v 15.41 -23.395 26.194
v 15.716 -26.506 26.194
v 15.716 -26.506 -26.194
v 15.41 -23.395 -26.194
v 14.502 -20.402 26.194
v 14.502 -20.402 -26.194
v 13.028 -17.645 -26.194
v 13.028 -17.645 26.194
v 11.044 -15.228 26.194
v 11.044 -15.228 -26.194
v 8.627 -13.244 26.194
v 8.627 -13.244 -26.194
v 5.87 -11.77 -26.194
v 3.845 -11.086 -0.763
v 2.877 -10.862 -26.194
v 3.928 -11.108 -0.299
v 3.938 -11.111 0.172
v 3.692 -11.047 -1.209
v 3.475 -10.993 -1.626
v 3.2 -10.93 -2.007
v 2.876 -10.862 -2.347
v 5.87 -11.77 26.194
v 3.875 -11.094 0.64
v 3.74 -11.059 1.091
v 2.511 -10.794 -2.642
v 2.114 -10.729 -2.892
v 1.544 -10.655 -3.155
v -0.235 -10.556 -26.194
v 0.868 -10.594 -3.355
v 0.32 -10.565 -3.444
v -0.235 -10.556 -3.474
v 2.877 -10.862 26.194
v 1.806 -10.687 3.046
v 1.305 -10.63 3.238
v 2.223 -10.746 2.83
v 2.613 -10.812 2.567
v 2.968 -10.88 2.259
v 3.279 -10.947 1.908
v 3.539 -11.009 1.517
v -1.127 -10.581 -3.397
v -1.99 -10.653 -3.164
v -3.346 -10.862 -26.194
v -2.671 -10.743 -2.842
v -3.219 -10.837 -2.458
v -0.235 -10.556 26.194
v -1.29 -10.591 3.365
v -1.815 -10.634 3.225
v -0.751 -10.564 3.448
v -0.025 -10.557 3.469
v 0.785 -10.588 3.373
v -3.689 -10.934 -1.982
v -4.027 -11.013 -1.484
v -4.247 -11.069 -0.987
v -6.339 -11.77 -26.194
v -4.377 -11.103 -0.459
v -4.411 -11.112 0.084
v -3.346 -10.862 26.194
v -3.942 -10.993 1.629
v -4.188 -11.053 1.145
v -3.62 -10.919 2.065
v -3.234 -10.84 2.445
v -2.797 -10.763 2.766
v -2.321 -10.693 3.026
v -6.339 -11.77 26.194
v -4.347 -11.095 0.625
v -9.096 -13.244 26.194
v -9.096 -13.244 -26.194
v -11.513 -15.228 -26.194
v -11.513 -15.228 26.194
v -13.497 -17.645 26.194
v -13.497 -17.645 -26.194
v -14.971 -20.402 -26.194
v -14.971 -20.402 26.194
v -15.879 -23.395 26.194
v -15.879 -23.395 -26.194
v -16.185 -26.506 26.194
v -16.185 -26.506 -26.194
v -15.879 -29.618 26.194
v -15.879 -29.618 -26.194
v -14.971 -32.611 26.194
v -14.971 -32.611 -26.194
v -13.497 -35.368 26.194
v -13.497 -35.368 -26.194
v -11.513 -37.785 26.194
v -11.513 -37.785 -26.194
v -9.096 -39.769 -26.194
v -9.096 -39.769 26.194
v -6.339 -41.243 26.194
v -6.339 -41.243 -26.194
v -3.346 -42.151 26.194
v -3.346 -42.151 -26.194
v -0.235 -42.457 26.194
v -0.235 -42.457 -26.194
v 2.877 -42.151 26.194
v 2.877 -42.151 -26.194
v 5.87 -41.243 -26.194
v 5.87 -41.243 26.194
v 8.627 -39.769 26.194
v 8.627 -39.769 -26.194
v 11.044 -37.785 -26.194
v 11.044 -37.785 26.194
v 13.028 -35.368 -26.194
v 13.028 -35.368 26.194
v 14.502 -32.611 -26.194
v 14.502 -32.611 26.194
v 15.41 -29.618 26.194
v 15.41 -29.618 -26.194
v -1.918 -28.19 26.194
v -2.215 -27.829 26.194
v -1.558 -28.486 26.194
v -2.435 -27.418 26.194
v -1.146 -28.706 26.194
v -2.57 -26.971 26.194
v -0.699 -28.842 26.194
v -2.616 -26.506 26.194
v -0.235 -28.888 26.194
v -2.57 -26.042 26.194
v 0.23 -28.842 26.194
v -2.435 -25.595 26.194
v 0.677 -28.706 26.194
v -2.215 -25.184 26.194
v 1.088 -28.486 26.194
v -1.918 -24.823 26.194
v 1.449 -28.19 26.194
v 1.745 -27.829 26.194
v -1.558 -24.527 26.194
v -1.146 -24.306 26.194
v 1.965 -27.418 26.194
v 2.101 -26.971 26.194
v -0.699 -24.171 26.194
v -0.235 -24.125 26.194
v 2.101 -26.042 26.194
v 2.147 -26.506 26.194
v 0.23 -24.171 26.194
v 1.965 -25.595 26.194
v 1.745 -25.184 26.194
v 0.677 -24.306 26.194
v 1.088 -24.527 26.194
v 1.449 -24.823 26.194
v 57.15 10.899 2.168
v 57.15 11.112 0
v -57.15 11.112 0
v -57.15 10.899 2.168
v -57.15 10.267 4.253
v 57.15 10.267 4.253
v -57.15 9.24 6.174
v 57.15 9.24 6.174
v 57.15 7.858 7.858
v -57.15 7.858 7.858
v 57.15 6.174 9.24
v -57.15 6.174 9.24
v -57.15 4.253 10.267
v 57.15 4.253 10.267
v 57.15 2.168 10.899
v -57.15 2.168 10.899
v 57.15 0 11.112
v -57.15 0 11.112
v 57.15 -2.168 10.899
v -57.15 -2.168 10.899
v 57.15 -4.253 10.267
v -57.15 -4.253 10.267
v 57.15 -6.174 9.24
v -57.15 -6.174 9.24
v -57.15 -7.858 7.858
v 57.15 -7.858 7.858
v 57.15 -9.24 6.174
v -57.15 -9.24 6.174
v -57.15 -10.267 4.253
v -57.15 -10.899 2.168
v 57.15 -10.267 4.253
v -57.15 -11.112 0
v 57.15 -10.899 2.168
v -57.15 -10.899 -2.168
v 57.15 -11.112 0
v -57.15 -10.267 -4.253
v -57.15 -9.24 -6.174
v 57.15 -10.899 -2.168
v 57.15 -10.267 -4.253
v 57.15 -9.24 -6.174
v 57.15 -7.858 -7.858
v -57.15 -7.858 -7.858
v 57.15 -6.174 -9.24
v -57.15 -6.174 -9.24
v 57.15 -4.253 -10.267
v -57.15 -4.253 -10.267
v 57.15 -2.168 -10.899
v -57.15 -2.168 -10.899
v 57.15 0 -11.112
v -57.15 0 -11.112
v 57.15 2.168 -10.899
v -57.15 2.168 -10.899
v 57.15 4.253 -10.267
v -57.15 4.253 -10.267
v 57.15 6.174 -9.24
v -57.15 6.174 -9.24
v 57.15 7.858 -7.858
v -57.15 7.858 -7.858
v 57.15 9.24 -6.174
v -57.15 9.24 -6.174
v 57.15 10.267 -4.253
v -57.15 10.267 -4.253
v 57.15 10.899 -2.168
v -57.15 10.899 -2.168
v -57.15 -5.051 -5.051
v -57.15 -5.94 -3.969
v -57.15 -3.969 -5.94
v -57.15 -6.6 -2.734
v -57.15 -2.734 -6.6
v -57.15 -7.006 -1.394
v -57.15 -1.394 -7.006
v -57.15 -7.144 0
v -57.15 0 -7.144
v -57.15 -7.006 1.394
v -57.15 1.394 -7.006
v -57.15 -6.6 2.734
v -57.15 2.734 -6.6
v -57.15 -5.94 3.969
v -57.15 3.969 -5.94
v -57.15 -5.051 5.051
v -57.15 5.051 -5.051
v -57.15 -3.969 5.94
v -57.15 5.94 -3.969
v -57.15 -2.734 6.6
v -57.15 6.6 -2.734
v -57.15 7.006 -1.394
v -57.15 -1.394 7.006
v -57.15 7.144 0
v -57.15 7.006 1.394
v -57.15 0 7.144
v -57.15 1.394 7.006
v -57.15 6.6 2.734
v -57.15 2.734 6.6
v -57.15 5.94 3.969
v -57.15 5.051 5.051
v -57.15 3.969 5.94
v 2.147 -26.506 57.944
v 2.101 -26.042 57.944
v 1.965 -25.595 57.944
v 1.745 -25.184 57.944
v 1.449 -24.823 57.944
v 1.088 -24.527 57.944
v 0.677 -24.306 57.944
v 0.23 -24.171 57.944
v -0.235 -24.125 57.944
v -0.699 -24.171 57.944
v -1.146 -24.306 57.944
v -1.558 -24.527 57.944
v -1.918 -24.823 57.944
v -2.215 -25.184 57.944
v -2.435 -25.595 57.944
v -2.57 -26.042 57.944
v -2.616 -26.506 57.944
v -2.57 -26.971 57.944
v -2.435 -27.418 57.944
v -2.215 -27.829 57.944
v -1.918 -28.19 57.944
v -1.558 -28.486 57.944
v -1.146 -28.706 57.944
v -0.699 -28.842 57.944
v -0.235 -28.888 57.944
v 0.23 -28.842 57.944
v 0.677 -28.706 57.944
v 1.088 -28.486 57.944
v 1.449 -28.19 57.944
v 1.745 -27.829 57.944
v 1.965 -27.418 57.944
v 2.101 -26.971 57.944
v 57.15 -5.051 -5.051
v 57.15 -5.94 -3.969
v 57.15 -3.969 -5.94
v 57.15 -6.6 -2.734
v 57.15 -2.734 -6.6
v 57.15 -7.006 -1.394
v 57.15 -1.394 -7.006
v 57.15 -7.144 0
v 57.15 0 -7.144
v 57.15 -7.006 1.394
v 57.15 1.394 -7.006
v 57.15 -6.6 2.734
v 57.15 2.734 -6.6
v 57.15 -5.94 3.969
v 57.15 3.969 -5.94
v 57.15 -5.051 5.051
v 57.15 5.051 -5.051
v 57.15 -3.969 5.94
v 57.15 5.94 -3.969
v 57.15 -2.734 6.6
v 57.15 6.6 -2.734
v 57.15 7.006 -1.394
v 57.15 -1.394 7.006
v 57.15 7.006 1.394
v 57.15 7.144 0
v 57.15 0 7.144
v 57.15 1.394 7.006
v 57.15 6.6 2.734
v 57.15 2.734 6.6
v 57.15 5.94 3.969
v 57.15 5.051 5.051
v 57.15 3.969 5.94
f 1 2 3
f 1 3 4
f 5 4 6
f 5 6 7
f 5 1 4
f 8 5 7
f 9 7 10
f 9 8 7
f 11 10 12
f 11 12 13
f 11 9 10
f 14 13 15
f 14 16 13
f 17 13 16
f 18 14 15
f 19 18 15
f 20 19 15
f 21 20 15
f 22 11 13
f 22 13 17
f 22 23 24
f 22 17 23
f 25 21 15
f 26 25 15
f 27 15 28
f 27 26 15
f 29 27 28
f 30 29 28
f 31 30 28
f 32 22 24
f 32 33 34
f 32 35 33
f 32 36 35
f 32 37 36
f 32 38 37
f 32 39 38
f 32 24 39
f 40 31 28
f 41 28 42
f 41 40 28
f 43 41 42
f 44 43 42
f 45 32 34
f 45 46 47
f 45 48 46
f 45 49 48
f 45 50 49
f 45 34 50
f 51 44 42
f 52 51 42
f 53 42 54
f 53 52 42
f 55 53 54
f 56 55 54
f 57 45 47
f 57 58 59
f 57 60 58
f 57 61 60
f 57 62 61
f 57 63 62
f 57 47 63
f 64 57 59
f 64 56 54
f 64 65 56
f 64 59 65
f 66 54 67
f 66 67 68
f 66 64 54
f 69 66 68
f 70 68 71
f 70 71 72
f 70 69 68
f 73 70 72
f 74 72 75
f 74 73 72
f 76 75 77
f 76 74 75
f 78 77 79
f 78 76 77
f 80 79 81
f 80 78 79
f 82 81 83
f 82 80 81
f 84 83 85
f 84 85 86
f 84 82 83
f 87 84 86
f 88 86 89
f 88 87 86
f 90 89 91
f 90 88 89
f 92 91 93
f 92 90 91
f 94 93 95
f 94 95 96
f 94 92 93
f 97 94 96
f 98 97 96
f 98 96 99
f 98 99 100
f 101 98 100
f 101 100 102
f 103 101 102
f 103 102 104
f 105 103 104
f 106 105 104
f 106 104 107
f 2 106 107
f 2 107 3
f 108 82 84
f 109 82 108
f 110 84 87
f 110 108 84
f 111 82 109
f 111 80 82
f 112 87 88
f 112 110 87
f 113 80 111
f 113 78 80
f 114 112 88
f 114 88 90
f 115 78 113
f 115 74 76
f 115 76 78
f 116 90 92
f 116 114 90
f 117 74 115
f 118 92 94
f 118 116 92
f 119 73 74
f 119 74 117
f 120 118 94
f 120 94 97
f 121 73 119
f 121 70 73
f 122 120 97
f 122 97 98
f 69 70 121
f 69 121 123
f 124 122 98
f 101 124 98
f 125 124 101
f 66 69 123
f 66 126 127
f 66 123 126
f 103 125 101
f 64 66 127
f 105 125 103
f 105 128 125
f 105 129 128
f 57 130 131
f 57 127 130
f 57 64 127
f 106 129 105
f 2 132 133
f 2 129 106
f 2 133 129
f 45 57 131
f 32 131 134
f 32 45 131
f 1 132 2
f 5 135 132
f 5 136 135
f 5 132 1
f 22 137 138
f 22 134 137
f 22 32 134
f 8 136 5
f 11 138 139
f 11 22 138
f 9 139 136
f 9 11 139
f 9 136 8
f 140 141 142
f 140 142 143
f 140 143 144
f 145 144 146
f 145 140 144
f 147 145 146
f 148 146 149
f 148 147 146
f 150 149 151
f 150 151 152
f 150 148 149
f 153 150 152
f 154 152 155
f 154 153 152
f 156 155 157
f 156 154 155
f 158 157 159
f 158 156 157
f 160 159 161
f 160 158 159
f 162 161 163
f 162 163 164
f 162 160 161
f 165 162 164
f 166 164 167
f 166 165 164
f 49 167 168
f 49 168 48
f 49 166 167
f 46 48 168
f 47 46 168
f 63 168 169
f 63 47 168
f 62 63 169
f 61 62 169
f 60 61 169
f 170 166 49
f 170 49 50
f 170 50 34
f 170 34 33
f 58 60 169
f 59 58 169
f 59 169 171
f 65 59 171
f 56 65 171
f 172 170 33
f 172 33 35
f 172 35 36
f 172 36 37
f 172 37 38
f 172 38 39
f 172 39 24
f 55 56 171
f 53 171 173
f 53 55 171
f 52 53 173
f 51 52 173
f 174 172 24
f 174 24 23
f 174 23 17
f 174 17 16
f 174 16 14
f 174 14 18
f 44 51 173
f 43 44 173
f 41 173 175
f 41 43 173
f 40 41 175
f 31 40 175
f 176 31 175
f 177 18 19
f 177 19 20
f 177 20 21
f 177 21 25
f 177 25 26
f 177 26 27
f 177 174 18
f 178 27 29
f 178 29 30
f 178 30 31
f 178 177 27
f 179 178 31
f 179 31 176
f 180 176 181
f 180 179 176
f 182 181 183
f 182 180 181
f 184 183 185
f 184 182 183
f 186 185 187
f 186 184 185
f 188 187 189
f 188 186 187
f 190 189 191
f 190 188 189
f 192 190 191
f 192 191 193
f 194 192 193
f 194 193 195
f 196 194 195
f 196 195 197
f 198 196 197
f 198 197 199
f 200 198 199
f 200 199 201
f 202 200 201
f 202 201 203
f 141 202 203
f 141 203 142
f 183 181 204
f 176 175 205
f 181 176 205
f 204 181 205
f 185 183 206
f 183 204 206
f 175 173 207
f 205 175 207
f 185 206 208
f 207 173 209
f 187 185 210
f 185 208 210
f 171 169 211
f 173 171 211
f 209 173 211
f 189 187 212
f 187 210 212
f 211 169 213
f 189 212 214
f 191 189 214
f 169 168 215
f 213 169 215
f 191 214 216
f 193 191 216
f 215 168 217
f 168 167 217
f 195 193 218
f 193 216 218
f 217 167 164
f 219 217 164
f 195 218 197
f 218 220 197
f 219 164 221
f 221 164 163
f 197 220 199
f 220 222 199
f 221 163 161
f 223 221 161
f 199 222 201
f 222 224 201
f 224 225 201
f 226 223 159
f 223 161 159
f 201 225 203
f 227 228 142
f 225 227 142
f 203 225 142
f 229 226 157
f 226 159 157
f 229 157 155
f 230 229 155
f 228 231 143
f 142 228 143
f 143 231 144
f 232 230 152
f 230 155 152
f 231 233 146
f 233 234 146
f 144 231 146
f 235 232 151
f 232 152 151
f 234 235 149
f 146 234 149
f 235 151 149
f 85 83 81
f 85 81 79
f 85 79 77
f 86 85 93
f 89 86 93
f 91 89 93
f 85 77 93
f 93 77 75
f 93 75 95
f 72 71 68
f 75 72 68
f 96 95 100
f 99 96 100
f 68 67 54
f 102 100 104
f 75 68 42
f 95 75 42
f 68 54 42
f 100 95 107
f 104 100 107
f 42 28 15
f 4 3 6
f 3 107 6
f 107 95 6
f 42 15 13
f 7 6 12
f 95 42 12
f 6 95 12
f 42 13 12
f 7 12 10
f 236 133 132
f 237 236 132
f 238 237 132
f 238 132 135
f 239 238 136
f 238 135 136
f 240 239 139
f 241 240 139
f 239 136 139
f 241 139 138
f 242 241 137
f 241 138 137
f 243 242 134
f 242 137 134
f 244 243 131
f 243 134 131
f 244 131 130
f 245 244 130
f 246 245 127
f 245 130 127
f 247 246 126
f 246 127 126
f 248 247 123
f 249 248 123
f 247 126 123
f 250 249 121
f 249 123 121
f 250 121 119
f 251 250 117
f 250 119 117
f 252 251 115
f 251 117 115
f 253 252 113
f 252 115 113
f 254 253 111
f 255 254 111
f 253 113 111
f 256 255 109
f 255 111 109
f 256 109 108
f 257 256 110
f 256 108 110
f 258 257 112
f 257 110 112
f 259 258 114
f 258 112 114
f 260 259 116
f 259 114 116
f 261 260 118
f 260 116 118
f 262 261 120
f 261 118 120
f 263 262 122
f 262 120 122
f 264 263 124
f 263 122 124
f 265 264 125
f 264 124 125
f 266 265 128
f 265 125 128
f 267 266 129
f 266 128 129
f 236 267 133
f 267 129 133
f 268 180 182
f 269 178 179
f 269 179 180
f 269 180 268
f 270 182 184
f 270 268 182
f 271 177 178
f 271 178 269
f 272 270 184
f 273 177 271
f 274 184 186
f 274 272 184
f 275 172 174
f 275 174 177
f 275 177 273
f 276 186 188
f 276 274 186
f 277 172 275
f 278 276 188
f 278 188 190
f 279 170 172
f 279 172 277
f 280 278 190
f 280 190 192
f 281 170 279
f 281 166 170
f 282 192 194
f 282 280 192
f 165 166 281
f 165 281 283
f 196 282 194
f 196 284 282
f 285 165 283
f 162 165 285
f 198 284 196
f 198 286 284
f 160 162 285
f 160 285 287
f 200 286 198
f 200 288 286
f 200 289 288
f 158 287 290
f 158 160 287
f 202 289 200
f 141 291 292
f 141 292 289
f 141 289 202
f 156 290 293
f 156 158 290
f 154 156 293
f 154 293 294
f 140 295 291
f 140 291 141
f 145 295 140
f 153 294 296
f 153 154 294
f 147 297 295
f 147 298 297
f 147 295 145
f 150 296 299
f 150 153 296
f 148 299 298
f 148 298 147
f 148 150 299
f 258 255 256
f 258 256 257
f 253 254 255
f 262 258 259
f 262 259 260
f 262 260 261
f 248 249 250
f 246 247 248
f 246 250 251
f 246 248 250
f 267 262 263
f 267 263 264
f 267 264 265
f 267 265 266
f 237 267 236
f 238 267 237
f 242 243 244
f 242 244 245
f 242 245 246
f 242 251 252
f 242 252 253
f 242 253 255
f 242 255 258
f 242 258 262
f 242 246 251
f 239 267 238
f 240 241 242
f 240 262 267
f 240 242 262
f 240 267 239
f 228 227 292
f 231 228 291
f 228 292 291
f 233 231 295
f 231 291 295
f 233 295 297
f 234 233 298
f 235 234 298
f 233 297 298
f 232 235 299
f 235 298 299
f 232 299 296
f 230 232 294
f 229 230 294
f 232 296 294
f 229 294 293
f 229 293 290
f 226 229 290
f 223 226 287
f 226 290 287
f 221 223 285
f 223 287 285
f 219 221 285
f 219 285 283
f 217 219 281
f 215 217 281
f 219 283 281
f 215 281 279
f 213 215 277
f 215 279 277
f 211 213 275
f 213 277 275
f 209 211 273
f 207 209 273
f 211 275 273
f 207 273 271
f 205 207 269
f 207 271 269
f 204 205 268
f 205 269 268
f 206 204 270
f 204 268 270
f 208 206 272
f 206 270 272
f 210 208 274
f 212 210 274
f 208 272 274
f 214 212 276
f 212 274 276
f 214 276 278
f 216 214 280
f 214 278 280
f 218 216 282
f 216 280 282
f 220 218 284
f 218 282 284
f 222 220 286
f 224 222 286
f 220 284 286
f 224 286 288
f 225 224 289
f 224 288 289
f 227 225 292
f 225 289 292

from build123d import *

# Parameters (mm, degrees)
F0_R     = 11.1125
F1_DEPTH = 57.15
F3_R     = 7.14375
F4_DEPTH = 114.3
F5_R     = 15.950796
F6_DEPTH = 26.19375
F7_R     = 2.38125
F8_DEPTH = 31.75


with BuildPart() as f1:
    # F0 (on Right) → F1 (new body, symmetric)
    with BuildSketch(Plane.YZ):
        Circle(F0_R)
    extrude(amount=F1_DEPTH, both=True)

    # F3 (on face) → F4 (cut)
    with BuildSketch(Plane.YZ.offset(57.15)):
        Circle(F3_R)
    extrude(amount=-F4_DEPTH, mode=Mode.SUBTRACT)

    # F5 (on Top) → F6 (join, symmetric)
    with BuildSketch(Plane.XY):
        with Locations((-0.234567, -26.506469)):
            Circle(F5_R)
    extrude(amount=F6_DEPTH, both=True)

    # F7 (on face) → F8 (join)
    with BuildSketch(Plane.XY.offset(26.19375)):
        with Locations((-0.234567, -26.506469)):
            Circle(F7_R)
    extrude(amount=F8_DEPTH)


solid = f1.part
